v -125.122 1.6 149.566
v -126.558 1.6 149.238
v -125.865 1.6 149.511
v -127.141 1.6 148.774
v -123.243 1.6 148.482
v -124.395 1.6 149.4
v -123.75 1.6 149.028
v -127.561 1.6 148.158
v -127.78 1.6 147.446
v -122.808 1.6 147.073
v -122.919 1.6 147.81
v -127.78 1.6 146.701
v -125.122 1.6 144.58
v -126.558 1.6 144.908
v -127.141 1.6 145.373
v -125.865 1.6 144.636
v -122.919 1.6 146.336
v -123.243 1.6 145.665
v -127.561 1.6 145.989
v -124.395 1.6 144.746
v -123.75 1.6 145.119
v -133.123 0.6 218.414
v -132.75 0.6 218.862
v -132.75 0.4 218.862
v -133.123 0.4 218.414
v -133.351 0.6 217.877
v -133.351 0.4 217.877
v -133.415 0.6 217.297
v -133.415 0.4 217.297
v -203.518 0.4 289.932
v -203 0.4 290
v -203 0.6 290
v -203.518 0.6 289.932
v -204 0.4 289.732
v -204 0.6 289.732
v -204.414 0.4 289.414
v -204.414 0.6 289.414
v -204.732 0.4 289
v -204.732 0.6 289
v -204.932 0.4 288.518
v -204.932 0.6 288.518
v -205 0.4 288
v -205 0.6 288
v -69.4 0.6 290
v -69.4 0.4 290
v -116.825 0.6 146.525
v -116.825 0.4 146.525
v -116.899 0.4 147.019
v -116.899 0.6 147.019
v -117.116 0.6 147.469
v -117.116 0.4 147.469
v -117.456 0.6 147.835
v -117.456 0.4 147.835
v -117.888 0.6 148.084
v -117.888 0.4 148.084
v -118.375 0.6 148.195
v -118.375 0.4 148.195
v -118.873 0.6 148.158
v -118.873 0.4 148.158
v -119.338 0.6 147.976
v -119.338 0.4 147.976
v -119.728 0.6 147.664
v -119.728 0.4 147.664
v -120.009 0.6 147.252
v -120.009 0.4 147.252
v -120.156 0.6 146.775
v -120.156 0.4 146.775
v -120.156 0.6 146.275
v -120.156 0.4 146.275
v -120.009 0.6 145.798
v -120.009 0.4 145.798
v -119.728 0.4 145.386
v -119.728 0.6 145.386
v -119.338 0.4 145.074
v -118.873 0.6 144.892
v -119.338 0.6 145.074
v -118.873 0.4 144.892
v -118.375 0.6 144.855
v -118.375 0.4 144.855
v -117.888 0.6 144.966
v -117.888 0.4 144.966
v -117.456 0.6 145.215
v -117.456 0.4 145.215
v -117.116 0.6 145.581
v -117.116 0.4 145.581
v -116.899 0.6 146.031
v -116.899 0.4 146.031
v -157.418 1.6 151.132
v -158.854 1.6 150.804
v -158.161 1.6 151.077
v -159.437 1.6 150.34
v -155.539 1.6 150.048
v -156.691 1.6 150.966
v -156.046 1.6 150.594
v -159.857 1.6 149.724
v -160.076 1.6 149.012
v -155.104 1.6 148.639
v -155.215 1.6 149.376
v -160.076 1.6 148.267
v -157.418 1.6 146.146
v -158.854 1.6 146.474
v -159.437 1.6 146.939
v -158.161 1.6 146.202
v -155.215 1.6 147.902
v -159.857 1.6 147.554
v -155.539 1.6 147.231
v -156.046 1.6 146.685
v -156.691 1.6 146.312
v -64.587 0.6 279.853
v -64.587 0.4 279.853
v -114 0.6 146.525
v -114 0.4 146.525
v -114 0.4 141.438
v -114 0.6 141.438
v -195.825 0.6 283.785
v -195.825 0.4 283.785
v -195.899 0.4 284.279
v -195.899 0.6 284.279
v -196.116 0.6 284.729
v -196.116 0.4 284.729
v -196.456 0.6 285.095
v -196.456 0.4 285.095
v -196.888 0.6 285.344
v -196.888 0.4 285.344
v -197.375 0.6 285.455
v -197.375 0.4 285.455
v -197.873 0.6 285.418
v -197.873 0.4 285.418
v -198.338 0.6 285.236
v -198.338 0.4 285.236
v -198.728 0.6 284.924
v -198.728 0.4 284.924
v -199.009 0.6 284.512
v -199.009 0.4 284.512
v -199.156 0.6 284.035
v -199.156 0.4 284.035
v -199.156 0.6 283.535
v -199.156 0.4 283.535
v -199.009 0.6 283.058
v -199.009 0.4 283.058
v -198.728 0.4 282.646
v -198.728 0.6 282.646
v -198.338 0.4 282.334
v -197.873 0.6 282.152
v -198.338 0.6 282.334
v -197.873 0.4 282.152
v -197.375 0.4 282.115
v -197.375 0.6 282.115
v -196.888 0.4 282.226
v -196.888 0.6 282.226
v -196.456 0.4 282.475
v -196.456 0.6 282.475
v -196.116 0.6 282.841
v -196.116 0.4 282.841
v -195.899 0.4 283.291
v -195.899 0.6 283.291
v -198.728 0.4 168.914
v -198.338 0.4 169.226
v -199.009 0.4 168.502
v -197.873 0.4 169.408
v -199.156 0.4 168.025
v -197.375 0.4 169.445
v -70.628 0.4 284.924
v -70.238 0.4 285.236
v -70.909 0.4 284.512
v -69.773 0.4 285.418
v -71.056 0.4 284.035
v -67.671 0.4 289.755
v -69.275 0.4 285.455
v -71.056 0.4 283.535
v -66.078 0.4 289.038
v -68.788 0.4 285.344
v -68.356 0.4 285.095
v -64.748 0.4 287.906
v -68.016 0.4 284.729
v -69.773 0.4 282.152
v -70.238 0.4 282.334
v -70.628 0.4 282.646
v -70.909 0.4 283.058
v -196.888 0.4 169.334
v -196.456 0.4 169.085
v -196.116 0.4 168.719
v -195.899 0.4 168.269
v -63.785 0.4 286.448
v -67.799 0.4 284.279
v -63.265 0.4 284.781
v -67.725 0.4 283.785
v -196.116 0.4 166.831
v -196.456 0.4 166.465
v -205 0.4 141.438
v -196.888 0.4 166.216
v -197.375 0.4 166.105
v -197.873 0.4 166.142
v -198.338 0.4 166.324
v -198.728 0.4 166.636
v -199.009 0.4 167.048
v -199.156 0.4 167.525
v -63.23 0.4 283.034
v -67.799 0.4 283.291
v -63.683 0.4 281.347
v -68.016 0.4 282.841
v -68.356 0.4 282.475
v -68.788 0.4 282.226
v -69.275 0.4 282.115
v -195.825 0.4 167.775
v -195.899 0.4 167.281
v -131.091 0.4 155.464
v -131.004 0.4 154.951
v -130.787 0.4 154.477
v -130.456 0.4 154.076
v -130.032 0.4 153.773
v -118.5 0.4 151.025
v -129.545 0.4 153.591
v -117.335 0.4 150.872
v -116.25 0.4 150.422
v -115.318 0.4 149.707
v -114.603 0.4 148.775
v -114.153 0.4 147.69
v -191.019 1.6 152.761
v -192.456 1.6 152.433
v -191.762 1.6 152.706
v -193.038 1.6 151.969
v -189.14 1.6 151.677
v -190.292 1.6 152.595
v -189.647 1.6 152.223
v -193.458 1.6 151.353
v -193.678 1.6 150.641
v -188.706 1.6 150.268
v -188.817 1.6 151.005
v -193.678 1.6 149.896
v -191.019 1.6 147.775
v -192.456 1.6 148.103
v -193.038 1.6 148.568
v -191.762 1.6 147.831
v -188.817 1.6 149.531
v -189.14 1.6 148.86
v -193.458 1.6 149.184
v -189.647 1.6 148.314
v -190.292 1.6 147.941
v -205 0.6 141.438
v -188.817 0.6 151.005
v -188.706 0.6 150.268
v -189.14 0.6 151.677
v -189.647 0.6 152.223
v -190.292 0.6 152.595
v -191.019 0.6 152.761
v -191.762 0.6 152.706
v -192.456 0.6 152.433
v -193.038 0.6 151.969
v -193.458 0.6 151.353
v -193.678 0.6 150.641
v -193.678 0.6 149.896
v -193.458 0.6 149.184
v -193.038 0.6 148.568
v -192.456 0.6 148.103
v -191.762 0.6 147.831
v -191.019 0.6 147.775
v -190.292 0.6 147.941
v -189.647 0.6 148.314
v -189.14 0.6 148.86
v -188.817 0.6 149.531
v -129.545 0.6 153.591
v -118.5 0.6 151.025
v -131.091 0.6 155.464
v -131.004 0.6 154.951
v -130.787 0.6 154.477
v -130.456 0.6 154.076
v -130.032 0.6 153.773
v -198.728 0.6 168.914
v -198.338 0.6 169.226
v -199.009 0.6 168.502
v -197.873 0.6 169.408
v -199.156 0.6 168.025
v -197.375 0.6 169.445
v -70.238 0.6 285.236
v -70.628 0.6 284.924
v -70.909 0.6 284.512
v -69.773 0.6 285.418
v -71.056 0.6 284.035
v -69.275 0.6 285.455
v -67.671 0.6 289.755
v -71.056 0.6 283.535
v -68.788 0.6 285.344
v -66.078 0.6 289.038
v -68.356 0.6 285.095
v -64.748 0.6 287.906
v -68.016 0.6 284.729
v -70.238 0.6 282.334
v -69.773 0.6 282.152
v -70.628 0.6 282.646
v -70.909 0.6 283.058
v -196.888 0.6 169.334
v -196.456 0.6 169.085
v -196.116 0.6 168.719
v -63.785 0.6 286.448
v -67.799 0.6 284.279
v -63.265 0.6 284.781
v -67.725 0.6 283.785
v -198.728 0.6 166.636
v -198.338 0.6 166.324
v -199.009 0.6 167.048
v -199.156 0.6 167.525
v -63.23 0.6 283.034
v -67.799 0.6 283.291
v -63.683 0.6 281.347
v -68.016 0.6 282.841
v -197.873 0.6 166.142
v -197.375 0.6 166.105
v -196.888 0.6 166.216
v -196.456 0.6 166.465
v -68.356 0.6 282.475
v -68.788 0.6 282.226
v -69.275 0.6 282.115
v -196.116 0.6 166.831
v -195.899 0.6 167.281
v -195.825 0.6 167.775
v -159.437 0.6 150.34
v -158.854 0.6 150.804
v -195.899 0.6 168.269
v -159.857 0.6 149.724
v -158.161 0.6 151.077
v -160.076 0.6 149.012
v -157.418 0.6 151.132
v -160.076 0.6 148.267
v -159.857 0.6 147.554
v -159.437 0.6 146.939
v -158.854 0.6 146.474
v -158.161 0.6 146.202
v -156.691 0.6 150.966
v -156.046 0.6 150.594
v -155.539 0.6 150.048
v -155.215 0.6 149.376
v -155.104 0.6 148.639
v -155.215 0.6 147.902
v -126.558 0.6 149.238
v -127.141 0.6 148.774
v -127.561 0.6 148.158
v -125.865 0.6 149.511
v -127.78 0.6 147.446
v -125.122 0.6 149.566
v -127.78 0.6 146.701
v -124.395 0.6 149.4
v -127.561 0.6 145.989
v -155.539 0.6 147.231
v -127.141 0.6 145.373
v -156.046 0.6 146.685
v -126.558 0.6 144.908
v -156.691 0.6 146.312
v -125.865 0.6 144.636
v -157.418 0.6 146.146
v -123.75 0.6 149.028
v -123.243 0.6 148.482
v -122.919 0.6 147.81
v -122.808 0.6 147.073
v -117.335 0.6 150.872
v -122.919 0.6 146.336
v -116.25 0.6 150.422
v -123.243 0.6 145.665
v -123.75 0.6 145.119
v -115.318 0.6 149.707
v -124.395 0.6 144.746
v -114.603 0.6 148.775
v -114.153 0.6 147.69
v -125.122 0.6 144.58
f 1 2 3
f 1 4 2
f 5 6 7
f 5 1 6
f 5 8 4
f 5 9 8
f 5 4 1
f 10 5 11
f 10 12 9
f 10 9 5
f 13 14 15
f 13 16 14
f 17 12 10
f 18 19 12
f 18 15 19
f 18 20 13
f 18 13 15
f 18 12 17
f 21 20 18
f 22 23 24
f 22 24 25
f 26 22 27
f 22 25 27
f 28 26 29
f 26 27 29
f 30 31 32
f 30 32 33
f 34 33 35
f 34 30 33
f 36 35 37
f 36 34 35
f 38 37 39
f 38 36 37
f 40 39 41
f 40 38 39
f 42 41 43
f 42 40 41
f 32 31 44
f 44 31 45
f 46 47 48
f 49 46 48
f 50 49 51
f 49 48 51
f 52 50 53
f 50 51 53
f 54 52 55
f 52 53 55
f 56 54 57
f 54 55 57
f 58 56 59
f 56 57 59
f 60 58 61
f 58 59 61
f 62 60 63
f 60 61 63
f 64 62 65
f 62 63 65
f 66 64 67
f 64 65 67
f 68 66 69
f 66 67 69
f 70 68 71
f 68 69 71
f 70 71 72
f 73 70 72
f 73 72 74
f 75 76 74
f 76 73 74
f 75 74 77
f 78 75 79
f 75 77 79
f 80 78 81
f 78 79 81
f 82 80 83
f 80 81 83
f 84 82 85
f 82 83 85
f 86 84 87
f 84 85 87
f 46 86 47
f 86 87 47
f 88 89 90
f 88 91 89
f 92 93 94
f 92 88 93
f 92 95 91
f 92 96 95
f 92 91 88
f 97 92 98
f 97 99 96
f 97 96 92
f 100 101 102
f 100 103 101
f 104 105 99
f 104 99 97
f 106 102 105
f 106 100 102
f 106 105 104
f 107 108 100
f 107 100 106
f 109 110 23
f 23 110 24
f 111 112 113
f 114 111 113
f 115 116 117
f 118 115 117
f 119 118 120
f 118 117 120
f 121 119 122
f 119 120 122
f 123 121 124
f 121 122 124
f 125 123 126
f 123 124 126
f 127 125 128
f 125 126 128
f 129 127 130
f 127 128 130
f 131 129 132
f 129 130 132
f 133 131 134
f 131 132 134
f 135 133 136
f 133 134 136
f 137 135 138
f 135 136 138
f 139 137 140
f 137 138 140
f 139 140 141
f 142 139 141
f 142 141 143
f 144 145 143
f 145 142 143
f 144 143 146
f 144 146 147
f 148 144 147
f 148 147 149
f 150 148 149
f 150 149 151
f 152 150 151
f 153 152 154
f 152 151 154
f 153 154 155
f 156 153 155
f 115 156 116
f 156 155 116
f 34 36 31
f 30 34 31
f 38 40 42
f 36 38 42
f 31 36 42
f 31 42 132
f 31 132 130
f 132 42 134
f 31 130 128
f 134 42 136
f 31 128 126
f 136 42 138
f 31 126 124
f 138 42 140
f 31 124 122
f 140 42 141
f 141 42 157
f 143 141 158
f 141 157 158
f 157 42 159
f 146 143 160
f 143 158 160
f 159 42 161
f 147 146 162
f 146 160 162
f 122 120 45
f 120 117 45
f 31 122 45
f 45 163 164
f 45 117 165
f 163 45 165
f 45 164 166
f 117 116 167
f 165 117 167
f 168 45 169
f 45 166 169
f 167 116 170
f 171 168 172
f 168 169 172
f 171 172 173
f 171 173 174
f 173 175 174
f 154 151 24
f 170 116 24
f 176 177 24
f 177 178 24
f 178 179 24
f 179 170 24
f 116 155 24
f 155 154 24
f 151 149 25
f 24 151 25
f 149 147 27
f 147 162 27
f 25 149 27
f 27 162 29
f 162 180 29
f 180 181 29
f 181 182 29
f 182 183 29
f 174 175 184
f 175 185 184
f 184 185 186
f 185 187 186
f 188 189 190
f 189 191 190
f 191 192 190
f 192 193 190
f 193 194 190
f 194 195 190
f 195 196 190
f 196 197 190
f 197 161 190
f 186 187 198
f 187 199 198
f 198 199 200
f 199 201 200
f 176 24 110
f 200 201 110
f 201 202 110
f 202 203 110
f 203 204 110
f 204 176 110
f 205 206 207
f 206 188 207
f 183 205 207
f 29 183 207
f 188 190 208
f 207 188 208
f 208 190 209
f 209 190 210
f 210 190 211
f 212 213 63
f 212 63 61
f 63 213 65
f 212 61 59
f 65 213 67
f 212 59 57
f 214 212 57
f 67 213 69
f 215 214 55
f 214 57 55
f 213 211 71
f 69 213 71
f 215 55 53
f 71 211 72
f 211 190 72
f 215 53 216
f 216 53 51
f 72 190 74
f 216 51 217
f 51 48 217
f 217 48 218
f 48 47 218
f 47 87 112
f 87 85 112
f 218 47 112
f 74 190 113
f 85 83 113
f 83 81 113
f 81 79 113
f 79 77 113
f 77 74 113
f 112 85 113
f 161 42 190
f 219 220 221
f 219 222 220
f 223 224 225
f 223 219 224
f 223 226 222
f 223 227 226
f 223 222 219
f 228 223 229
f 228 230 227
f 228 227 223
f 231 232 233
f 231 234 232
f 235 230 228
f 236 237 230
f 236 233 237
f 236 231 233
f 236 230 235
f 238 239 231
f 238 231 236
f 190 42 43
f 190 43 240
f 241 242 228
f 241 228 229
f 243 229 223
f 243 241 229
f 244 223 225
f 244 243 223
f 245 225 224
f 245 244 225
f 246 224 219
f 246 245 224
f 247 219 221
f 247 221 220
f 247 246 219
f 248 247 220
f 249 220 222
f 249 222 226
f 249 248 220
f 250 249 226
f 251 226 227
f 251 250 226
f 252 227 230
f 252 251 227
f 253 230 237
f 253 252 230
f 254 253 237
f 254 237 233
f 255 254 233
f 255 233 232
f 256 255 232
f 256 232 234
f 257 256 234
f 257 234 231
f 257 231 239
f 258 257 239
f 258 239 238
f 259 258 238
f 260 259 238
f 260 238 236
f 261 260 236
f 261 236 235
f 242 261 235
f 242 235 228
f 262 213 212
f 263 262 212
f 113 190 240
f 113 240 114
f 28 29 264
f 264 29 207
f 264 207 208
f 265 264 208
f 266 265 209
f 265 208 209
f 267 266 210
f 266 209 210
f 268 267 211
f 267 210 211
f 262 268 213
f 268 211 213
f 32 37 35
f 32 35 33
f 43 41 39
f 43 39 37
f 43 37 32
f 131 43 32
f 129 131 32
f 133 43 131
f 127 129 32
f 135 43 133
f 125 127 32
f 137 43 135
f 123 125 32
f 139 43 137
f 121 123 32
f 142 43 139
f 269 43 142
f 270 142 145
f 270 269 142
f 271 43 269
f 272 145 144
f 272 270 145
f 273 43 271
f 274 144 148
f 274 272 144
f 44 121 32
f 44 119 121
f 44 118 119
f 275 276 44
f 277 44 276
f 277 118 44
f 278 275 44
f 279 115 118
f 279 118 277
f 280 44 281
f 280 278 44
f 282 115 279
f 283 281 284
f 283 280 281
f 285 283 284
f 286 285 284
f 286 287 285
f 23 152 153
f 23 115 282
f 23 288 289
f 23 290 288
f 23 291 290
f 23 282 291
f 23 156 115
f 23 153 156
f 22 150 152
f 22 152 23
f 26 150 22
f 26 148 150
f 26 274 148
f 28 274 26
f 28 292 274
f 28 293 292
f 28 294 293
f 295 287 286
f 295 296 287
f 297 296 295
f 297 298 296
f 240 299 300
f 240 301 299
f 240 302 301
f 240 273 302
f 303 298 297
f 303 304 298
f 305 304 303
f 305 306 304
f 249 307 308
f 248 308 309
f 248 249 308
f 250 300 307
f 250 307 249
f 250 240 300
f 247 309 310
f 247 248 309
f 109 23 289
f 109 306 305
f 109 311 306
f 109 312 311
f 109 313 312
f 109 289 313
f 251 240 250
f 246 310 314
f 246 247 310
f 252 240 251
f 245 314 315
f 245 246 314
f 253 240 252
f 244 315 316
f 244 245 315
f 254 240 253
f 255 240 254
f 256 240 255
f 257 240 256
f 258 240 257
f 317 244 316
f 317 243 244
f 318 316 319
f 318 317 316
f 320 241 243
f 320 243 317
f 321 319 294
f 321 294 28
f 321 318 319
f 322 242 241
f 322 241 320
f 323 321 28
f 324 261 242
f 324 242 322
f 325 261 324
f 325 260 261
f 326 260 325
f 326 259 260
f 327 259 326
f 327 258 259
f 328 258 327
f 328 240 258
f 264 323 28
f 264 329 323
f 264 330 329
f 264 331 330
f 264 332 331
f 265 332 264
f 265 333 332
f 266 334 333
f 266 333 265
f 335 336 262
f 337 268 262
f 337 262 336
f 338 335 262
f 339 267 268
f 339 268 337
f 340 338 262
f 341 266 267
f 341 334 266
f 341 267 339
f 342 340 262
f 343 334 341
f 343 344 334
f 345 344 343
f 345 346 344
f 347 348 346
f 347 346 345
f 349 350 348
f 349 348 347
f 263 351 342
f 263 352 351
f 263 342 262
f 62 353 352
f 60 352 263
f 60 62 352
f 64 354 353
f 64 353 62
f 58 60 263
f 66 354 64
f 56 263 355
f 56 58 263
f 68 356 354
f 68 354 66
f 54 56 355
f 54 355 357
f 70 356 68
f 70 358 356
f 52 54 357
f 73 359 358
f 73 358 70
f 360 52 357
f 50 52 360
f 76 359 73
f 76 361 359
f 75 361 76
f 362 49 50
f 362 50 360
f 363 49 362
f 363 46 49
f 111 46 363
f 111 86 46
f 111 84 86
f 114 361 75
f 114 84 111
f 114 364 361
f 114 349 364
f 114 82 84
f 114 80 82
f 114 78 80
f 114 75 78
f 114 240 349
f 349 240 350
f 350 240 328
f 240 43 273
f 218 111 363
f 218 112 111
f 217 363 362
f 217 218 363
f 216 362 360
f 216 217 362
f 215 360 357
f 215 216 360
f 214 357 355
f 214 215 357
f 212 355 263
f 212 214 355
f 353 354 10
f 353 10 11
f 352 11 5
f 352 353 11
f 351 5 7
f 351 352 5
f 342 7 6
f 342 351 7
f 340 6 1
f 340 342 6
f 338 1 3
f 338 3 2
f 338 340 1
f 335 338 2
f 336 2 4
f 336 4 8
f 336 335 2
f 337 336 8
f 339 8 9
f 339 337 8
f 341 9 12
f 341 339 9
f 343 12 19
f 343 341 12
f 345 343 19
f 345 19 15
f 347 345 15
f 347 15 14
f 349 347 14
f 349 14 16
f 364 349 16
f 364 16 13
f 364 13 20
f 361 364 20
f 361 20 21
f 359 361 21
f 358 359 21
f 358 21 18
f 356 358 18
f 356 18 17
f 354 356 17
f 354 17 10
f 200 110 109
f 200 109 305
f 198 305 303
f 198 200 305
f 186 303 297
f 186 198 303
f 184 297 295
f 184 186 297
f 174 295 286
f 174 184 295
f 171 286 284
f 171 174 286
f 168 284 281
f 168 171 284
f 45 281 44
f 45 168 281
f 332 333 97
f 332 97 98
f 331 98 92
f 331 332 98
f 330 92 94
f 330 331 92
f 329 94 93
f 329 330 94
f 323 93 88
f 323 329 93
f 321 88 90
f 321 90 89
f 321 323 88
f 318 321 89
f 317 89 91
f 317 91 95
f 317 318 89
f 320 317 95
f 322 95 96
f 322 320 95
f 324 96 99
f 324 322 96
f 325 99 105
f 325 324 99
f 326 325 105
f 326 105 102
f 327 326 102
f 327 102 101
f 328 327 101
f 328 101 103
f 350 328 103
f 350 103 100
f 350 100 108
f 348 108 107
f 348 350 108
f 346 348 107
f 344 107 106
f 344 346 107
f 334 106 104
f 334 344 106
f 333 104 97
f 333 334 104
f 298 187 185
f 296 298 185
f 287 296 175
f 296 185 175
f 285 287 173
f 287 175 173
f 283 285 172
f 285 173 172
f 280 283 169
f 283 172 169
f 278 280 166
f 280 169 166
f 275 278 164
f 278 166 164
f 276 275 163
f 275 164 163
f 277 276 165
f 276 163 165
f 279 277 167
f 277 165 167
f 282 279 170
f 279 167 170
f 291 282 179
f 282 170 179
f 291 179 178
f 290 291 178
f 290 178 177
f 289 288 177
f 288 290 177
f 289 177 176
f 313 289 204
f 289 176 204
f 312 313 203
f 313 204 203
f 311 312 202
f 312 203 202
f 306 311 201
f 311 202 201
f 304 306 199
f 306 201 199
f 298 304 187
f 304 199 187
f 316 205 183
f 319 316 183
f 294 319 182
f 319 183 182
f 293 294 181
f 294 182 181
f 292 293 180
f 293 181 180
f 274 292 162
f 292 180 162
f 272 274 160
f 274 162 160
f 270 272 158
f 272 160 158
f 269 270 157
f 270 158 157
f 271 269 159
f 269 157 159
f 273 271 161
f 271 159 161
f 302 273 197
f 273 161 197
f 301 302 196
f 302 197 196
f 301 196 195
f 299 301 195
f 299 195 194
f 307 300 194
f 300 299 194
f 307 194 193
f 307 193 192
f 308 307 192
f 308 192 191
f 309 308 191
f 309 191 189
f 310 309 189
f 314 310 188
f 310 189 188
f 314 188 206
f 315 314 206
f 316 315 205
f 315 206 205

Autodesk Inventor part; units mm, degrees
ref_plane "YZ Plane" through (0, 0, 0) normal (1, 0, 0) x (0, 1, 0)
ref_plane "Work Plane1" through (-203, 0.4, 290) normal (0, 1, 0) x (1, 0, 0)
sketch "Sketch1" plane through (-203, 0.4, 290) normal (0, 1, 0) x (1, 0, 0)
  arc A0 (133.6, 0) -> (138.4129, 10.1472) centre (133.6, 6.215) ccw projected
  circle A1 centre (133.6, 6.215) radius 1.675 projected
  circle A2 centre (133.6, 6.215) radius 1.675 projected
  circle A3 centre (133.6, 6.215) radius 1.675 projected
  circle A4 centre (133.6, 6.215) radius 1.675 projected
  arc A5 (133.6, 0) -> (138.4129, 10.1472) centre (133.6, 6.215) ccw projected
  arc A6 (133.6, 0) -> (138.4129, 10.1472) centre (133.6, 6.215) ccw projected
  arc A7 (133.6, 0) -> (138.4129, 10.1472) centre (133.6, 6.215) ccw projected
  circle A8 centre (84.5, 143.475) radius 1.675 projected
  arc A9 (84.5, 138.975) -> (89, 143.475) centre (84.5, 143.475) ccw projected
  arc A10 (73.455, 136.4093) -> (71.909, 134.5363) centre (73.9075, 134.4612) ccw projected
  arc A11 (73.455, 136.4093) -> (71.909, 134.5363) centre (73.9075, 134.4612) ccw projected
  circle A12 centre (5.5, 122.225) radius 1.675 projected
  circle A13 centre (5.5, 122.225) radius 1.675 projected
  circle A14 centre (5.5, 122.225) radius 1.675 projected
  circle A15 centre (5.5, 122.225) radius 1.675 projected
  line L0 (69.5853, 72.7034) -> (71.909, 134.5363) projected
  line L1 (69.5853, 72.7034) -> (71.909, 134.5363) projected
  line L2 (69.5853, 72.7034) -> (71.909, 134.5363) projected
  line L3 (69.5853, 72.7034) -> (71.909, 134.5363) projected
  circle A16 centre (5.5, 6.215) radius 1.675 projected
  line L4 (0, 0) -> (133.6, 0) projected
  line L5 (0, 0) -> (133.6, 0) projected
  line L6 (0, 0) -> (133.6, 0) projected
  line L7 (0, 0) -> (133.6, 0) projected
  line L8 (138.4129, 10.1472) -> (70.2502, 71.1379) projected
  line L9 (138.4129, 10.1472) -> (70.2502, 71.1379) projected
  line L10 (138.4129, 10.1472) -> (70.2502, 71.1379) projected
  line L11 (138.4129, 10.1472) -> (70.2502, 71.1379) projected
  arc A17 (73.455, 136.4093) -> (71.909, 134.5363) centre (73.9075, 134.4612) ccw projected
  arc A18 (73.455, 136.4093) -> (71.909, 134.5363) centre (73.9075, 134.4612) ccw projected
  circle A19 centre (5.5, 6.215) radius 1.675 projected
  arc A20 (-2, 2) -> (0, 0) centre (0, 2) ccw projected
  arc A21 (-2, 2) -> (0, 0) centre (0, 2) ccw projected
  arc A22 (-2, 2) -> (0, 0) centre (0, 2) ccw projected
  arc A23 (-2, 2) -> (0, 0) centre (0, 2) ccw projected
  circle A24 centre (5.5, 6.215) radius 1.675 projected
  circle A25 centre (5.5, 6.215) radius 1.675 projected
  arc A26 (69.5853, 72.7034) -> (70.2502, 71.1379) centre (71.5839, 72.6283) ccw projected
  arc A27 (69.5853, 72.7034) -> (70.2502, 71.1379) centre (71.5839, 72.6283) ccw projected
  arc A28 (69.5853, 72.7034) -> (70.2502, 71.1379) centre (71.5839, 72.6283) ccw projected
  arc A29 (69.5853, 72.7034) -> (70.2502, 71.1379) centre (71.5839, 72.6283) ccw projected
  arc A30 (84.5, 138.975) -> (89, 143.475) centre (84.5, 143.475) ccw projected
  circle A31 centre (84.5, 143.475) radius 1.675 projected
  circle A32 centre (84.5, 143.475) radius 1.675 projected
  circle A33 centre (84.5, 143.475) radius 1.675 projected
  arc A34 (84.5, 138.975) -> (89, 143.475) centre (84.5, 143.475) ccw projected
  arc A35 (84.5, 138.975) -> (89, 143.475) centre (84.5, 143.475) ccw projected
  line L12 (73.455, 136.4093) -> (84.5, 138.975) projected
  line L13 (73.455, 136.4093) -> (84.5, 138.975) projected
  line L14 (73.455, 136.4093) -> (84.5, 138.975) projected
  line L15 (73.455, 136.4093) -> (84.5, 138.975) projected
  line L16 (-2, 2) -> (-2, 148.562)
  line L17 (-2, 272.9952) -> (-2, 2) projected
  line L18 (-2, 148.562) -> (89, 148.562)
  line L19 (89, 143.475) -> (89, 199.525) projected
  line L20 (89, 148.562) -> (89, 143.475)
  point P0 (203, 290)
  point P1 (-2, 2)
extrude "Extrusion1" add sketch "Sketch1" along normal blind 0.2
ref_plane "Work Plane2" through (-203, 0.6, 290) normal (0, 1, 0) x (1, 0, 0)
sketch "Sketch2" plane through (-203, 0.6, 290) normal (0, 1, 0) x (1, 0, 0)
  line L0 (-2, 272.9952) -> (-2, 2) projected
  arc A0 (84.5, 138.975) -> (89, 143.475) centre (84.5, 143.475) ccw projected
  line L1 (-2, 139.0629) -> (89, 143.475)
  circle A1 centre (11.7945, 139.7317) radius 2.5
  circle A2 centre (77.6916, 142.9267) radius 2.5
  circle A3 centre (45.3956, 141.3608) radius 2.5
  point P0 (203, 290)
  dimension "d3" = 5
  dimension "d6" = 5
  dimension "d7" = 5
extrude "Extrusion2" add sketch "Sketch2" along normal blind 1
properties part number "base_main_pcb_p1_itr2"
